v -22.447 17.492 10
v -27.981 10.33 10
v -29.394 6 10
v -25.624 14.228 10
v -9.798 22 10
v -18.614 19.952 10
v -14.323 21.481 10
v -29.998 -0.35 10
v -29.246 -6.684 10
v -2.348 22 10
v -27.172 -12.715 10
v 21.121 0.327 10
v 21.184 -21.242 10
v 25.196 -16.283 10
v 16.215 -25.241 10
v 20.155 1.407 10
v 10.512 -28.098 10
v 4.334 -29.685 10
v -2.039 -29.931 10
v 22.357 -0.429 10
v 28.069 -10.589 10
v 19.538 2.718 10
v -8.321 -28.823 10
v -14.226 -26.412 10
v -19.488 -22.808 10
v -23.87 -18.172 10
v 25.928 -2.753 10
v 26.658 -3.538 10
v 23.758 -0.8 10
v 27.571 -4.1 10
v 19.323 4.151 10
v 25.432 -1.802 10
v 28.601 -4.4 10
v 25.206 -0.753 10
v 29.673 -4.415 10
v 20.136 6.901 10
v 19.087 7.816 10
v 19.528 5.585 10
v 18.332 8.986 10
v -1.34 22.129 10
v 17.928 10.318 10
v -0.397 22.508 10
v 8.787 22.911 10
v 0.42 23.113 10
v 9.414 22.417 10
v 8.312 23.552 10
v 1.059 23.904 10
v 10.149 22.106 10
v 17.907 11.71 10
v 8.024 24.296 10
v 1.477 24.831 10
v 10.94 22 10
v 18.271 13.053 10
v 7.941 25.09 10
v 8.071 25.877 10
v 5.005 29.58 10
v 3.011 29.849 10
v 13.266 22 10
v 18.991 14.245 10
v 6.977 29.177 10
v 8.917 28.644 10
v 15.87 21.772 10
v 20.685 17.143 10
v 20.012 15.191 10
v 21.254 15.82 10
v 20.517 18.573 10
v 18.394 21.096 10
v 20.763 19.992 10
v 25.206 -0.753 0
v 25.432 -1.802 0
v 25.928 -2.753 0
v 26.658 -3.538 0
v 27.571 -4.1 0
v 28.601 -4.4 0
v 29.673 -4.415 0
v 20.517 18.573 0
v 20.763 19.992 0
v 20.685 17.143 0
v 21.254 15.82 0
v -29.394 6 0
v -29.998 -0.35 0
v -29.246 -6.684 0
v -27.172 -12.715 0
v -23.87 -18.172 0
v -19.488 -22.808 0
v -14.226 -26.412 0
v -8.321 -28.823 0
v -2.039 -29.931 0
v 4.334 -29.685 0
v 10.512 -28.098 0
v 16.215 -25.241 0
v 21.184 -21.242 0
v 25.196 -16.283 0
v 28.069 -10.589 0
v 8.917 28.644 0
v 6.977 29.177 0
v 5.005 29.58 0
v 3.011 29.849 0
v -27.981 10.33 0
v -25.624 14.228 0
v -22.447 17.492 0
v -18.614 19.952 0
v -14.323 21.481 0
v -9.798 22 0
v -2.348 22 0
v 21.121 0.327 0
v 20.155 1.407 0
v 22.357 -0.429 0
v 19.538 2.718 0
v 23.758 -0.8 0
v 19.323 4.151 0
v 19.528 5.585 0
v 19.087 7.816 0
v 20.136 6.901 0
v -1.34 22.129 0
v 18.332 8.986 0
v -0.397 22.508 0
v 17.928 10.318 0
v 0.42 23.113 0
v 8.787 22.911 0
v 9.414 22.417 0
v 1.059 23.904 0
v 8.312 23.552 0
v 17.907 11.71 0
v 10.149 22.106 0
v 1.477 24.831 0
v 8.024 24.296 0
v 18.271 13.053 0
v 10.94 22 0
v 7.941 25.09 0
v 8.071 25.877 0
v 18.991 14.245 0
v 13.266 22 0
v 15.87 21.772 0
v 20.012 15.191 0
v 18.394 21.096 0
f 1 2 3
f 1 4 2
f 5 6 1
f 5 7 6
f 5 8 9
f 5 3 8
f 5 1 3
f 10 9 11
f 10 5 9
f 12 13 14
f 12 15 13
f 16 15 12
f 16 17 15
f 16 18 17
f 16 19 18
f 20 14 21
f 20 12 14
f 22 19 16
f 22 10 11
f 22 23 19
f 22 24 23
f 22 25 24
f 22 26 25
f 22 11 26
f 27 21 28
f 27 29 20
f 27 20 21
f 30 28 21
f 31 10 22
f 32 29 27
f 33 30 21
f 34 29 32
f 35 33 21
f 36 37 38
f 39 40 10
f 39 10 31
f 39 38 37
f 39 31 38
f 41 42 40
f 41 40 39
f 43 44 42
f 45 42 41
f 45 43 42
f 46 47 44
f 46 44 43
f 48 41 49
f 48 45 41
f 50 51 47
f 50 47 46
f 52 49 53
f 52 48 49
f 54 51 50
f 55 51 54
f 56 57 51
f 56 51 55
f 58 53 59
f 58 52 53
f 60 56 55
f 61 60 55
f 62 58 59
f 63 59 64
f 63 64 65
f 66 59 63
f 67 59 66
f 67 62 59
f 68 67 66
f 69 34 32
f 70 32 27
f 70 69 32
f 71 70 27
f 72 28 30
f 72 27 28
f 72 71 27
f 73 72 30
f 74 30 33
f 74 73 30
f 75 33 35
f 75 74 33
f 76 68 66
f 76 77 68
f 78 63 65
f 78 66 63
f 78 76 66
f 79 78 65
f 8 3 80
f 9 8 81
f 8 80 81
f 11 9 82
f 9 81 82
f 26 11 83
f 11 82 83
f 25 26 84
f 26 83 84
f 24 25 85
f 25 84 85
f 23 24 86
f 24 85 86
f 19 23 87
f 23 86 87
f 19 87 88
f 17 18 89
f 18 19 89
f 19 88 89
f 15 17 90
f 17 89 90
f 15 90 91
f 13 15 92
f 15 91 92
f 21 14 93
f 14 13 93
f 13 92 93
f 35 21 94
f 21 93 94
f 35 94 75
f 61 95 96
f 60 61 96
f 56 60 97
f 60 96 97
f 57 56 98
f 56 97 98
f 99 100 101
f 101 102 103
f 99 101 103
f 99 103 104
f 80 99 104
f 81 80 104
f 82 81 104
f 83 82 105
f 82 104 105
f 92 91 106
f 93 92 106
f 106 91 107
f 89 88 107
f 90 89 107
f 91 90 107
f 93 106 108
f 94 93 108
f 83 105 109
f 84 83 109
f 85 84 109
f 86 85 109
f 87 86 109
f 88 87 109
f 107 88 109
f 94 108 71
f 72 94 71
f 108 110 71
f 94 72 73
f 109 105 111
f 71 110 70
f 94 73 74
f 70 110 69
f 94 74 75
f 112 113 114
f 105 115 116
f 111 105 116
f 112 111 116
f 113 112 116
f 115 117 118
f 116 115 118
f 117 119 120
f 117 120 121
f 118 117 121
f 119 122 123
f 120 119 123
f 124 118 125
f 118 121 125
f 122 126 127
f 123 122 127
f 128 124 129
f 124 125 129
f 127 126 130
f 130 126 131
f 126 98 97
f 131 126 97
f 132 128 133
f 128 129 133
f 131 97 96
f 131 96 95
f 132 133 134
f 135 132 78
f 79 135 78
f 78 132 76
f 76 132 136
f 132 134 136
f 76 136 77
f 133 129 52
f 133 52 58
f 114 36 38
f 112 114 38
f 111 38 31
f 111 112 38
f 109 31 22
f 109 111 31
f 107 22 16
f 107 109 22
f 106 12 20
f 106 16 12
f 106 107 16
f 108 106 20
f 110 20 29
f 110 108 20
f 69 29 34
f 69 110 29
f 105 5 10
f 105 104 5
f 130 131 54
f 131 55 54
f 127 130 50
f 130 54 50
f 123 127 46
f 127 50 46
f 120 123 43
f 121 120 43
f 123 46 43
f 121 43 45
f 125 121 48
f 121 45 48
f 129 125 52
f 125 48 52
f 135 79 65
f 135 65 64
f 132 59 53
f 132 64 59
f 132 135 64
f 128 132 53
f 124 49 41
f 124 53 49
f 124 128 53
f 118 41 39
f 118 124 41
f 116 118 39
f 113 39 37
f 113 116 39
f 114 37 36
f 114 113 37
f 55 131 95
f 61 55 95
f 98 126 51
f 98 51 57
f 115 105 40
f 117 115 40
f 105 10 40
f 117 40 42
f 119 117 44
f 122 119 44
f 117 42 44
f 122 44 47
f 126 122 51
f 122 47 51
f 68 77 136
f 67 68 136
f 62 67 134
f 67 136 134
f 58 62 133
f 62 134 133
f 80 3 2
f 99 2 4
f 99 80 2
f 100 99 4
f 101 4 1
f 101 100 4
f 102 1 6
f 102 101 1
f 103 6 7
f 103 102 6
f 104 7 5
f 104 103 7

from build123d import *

# Parameters (mm, degrees)
BOX002_W                  = 10
BOX002_H                  = 14
BOX002_DEPTH              = 15
CYLINDER002_R             = 5
CYLINDER002_DEPTH         = 15
CYLINDER001_R             = 5
CYLINDER001_DEPTH         = 15
CYLINDER004_R             = 4
CYLINDER004_DEPTH         = 15
CYLINDER003_R             = 5
CYLINDER003_DEPTH         = 15
FUSION003_PLACEMENT_ANGLE = 20
BOX001_W                  = 6
BOX001_H                  = 25
BOX001_DEPTH              = 38
BOX001_PLACEMENT_ANGLE    = -17
BOX_W                     = 59
BOX_H                     = 14
BOX_DEPTH                 = 15
CYLINDER_R                = 30
CYLINDER_DEPTH            = 10
FILLET_R                  = 20
FILLET001_R               = 15
FILLET002_R               = 4
FILLET003_R               = 3


with BuildPart() as cube002:
    # Box002 → Box002 (new body)
    with BuildSketch(Plane(origin=(23, -9, -2), x_dir=(1, 0, 0), z_dir=(0, 0, 1))):
        with Locations((5, 7)):
            Rectangle(BOX002_W, BOX002_H)
    extrude(amount=BOX002_DEPTH)


with BuildPart() as fusion:
    # Cylinder002 → Cylinder002 (new body)
    with BuildSketch(Plane(origin=(24, 2, -3), x_dir=(1, 0, 0), z_dir=(0, 0, 1))):
        Circle(CYLINDER002_R)
    extrude(amount=CYLINDER002_DEPTH)

    # Fusion: union Cube002
    add(cube002.part)


with BuildPart() as fusion001:
    # Cylinder001 → Cylinder001 (new body)
    with BuildSketch(Plane(origin=(29, 8, -3), x_dir=(1, 0, 0), z_dir=(0, 0, 1))):
        Circle(CYLINDER001_R)
    extrude(amount=CYLINDER001_DEPTH)

    # Fusion001: union Fusion
    add(fusion.part)


with BuildPart() as fusion002:
    # Cylinder004 → Cylinder004 (new body)
    with BuildSketch(Plane(origin=(26, -11, -3), x_dir=(1, 0, 0), z_dir=(0, 0, 1))):
        Circle(CYLINDER004_R)
    extrude(amount=CYLINDER004_DEPTH)

    # Fusion002: union Fusion001
    add(fusion001.part)


with BuildPart() as fusion003:
    # Cylinder003 → Cylinder003 (new body)
    with BuildSketch(Plane(origin=(23, -5, -3), x_dir=(1, 0, 0), z_dir=(0, 0, 1))):
        Circle(CYLINDER003_R)
    extrude(amount=CYLINDER003_DEPTH)

    # Fusion003: union Fusion002
    add(fusion002.part)


with BuildPart() as fusion003_1:
    # Fusion003 placement: moved
    add(fusion003.part.moved(Location((1, 1, 0))).rotate(Axis((1, 1, 0), (0, 0, 1)), FUSION003_PLACEMENT_ANGLE))


with BuildPart() as cube001:
    # Box001 → Box001 (new body)
    with BuildSketch(Plane.XY):
        with Locations((3, 12.5)):
            Rectangle(BOX001_W, BOX001_H)
    extrude(amount=BOX001_DEPTH)


with BuildPart() as cube001_1:
    # Box001 placement: moved
    add(cube001.part.moved(Location((0, 20, -14))).rotate(Axis((0, 20, -14), (0, 0, 1)), BOX001_PLACEMENT_ANGLE))


with BuildPart() as cut:
    # Box → Box (new body)
    with BuildSketch(Plane(origin=(-29, 22, -3), x_dir=(1, 0, 0), z_dir=(0, 0, 1))):
        with Locations((29.5, 7)):
            Rectangle(BOX_W, BOX_H)
    extrude(amount=BOX_DEPTH)

    # Cut: cut Cube001
    add(cube001_1.part, mode=Mode.SUBTRACT)


with BuildPart() as cut002:
    # Cylinder → Cylinder (new body)
    with BuildSketch(Plane.XY):
        Circle(CYLINDER_R)
    extrude(amount=CYLINDER_DEPTH)

    # Cut001: cut Cut
    add(cut.part, mode=Mode.SUBTRACT)

    # Fillet
    fillet_edges = [cut002.edges().sort_by_distance(p)[0] for p in [
        (-20.396078, 22, 5),
    ]]
    fillet(fillet_edges, radius=FILLET_R)

    # Fillet001
    fillet001_edges = [cut002.edges().sort_by_distance(p)[0] for p in [
        (20.396078, 22, 5),
    ]]
    fillet(fillet001_edges, radius=FILLET001_R)

    # Fillet002
    fillet002_edges = [cut002.edges().sort_by_distance(p)[0] for p in [
        (0.611461, 22, 5),
    ]]
    fillet(fillet002_edges, radius=FILLET002_R)

    # Fillet003
    fillet003_edges = [cut002.edges().sort_by_distance(p)[0] for p in [
        (6.885612, 22, 5),
    ]]
    fillet(fillet003_edges, radius=FILLET003_R)

    # Cut002: cut Fusion003
    add(fusion003_1.part, mode=Mode.SUBTRACT)


solid = cut002.part
